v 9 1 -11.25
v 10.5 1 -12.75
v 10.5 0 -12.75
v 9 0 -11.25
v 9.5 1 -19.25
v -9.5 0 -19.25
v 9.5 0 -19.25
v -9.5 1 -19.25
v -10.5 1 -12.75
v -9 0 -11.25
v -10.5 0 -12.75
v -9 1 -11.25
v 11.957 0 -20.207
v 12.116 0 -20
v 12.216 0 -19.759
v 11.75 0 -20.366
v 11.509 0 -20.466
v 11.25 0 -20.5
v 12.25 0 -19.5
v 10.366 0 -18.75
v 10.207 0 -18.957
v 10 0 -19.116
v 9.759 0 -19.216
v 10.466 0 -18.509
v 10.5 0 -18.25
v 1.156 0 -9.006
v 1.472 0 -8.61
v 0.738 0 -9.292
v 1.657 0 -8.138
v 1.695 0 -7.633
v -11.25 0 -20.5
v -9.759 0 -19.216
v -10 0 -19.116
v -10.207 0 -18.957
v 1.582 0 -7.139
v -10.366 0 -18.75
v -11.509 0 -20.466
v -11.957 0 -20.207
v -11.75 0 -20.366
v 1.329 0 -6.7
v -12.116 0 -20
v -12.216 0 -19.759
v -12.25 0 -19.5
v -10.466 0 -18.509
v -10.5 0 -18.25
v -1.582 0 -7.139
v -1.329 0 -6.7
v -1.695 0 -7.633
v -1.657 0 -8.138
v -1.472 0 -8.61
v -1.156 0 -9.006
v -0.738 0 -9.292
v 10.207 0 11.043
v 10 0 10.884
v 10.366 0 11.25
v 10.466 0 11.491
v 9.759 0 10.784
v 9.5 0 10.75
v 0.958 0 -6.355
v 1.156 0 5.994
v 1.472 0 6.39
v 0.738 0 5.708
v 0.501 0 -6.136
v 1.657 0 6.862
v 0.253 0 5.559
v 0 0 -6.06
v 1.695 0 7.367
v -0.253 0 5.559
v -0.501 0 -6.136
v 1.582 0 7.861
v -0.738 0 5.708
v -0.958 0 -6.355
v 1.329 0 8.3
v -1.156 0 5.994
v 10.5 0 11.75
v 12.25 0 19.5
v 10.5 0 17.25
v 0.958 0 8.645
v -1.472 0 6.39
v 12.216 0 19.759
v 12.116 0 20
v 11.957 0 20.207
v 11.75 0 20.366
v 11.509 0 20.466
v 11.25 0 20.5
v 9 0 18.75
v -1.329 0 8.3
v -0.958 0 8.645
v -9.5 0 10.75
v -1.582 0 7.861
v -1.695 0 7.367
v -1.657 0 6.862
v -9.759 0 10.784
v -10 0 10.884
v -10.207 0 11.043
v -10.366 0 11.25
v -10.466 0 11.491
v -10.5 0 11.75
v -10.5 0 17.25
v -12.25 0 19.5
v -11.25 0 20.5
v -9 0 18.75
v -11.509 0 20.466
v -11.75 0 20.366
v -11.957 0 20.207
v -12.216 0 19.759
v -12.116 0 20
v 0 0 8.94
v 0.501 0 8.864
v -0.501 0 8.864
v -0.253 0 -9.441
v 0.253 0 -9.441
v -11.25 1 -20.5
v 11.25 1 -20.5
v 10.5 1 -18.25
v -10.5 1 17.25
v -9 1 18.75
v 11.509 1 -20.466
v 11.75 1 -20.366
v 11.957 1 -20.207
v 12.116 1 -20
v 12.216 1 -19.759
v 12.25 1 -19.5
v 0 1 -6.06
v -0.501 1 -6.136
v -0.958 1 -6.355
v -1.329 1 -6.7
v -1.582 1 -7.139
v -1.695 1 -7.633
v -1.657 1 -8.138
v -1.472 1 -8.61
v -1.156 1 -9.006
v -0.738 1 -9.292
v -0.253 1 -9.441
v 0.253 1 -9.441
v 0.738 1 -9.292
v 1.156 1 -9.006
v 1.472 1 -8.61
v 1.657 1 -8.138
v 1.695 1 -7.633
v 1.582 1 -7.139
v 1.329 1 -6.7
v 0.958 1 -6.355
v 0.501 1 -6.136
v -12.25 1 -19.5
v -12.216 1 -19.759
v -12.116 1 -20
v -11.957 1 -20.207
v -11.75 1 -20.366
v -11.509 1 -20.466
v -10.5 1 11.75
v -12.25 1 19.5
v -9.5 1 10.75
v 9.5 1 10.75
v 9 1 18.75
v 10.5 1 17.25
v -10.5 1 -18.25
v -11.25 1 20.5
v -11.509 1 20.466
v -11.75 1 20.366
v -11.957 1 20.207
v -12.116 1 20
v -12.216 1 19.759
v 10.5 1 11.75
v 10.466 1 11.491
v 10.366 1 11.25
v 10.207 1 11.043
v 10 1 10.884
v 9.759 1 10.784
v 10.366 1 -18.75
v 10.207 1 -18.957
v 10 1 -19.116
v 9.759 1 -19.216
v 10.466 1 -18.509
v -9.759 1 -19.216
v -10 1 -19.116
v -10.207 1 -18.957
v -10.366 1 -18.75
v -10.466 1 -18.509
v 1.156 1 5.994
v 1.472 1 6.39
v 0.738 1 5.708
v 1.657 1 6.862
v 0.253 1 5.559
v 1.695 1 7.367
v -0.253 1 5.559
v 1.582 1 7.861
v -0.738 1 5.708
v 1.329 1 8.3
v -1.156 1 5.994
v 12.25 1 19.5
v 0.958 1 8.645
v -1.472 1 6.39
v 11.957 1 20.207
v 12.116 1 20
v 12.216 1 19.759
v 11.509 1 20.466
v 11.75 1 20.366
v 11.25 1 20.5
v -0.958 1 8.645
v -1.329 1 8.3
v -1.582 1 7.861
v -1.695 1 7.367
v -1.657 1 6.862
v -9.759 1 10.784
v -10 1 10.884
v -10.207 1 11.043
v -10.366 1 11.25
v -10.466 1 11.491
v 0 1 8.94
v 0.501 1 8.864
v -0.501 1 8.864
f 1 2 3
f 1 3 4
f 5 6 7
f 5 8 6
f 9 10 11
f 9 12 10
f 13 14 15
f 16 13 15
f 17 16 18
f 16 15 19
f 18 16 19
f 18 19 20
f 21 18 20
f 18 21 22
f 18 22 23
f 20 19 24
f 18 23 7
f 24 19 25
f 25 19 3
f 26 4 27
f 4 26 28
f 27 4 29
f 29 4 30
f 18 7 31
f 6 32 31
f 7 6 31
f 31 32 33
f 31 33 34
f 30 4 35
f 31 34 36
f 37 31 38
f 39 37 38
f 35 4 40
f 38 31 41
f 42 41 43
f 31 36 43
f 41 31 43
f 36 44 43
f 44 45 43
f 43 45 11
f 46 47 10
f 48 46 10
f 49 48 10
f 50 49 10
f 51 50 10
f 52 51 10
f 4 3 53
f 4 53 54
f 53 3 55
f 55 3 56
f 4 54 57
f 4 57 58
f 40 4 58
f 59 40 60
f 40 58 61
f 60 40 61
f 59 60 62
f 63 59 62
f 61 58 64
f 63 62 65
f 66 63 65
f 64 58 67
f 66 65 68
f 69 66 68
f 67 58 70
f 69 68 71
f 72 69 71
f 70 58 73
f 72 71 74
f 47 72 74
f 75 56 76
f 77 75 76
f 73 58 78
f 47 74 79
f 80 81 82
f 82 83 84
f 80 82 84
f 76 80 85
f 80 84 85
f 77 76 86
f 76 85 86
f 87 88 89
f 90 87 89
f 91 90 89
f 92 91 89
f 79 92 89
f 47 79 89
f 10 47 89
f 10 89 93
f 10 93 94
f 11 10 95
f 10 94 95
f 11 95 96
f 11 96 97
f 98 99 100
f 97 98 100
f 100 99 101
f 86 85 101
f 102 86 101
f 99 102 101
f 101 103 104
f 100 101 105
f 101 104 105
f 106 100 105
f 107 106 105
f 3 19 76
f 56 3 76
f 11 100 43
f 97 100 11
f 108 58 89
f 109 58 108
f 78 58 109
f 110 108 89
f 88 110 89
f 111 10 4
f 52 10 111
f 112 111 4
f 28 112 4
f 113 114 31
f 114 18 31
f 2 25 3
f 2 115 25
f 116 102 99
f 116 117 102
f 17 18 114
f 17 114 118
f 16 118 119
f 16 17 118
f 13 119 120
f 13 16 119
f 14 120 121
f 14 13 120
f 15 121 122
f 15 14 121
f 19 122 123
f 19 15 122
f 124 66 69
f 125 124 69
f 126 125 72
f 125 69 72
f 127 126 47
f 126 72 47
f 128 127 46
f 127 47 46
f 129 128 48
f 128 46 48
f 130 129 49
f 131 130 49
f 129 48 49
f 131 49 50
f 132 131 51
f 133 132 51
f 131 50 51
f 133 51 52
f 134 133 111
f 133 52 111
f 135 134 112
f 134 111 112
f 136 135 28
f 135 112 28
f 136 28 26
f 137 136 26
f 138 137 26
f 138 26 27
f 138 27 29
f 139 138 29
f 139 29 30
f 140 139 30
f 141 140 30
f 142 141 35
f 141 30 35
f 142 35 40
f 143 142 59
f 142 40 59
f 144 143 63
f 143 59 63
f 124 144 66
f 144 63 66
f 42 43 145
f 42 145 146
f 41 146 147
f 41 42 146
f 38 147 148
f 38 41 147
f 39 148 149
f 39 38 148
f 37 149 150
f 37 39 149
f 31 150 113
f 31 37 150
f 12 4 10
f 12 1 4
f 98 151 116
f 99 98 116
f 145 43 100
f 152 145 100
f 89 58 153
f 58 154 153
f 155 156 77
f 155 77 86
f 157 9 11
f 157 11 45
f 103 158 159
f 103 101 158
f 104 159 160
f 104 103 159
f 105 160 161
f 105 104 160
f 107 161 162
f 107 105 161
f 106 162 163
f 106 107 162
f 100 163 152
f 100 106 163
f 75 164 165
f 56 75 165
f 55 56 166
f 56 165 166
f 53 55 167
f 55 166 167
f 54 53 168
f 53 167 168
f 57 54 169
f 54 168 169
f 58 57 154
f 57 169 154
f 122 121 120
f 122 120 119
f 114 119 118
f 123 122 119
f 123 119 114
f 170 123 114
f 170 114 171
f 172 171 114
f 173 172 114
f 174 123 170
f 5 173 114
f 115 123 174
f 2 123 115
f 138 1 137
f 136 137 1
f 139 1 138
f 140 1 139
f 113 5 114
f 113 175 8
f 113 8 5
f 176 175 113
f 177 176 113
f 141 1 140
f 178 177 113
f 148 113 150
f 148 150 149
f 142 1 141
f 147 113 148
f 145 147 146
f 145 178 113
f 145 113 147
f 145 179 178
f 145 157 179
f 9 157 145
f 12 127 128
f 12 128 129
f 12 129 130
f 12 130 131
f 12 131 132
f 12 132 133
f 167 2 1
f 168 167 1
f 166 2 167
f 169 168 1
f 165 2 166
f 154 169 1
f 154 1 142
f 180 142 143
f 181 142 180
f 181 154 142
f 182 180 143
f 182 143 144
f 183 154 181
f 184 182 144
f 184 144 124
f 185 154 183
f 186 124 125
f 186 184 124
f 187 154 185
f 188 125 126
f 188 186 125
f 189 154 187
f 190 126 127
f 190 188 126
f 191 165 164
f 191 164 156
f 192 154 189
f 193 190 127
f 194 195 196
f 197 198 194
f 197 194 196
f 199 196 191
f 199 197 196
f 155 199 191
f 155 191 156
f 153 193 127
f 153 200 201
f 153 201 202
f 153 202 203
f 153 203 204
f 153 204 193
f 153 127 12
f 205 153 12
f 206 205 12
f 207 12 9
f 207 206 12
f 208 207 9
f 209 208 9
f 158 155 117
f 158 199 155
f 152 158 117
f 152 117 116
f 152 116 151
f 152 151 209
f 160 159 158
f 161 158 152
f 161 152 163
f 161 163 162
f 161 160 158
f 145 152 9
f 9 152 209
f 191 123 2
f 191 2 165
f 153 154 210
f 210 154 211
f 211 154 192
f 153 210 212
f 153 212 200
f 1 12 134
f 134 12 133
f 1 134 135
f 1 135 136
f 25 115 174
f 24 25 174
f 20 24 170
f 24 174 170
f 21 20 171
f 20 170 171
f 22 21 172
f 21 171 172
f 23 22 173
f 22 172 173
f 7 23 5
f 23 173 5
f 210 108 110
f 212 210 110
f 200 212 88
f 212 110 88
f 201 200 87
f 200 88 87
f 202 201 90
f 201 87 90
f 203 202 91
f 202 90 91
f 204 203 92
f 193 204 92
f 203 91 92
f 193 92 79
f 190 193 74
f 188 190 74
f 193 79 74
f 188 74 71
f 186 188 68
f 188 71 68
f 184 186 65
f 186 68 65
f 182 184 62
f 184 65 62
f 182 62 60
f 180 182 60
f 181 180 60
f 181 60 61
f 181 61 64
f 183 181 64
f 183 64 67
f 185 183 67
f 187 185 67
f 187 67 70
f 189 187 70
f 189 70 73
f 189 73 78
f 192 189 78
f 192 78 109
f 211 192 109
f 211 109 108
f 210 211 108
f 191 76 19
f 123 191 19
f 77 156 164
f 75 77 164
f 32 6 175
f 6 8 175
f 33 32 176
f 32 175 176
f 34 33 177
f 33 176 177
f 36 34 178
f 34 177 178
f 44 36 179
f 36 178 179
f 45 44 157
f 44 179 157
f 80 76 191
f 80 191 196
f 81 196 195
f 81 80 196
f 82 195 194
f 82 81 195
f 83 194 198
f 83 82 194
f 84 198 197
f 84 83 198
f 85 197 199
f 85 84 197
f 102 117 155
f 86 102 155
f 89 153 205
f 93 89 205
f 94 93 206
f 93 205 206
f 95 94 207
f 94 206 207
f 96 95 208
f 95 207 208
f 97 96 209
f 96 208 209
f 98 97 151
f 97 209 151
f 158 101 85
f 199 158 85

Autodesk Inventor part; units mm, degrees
ref_plane "YZ Plane" through (0, 0, 0) normal (1, 0, 0) x (0, 1, 0)
ref_plane "XZ Plane" through (0, 0, 0) normal (0, 1, 0) x (-1, 0, 0)
ref_plane "XY Plane" through (0, 0, 0) normal (0, 0, 1) x (1, 0, 0)
sketch "Sketch1" plane through (0, 0, 0) normal (0, 1, 0) x (-1, 0, 0)
  line L0 (-11.25, -20.5) -> (11.25, -20.5)
  line L1 (12.25, -19.5) -> (12.25, 19.5)
  line L2 (11.25, 20.5) -> (-11.25, 20.5)
  line L3 (-12.25, 19.5) -> (-12.25, -19.5)
  line L4 (-12.25, -20.5) -> (12.25, 20.5) construction
  line L5 (12.25, -20.5) -> (-12.25, 20.5) construction
  arc A0 (12.25, 19.5) -> (11.25, 20.5) centre (11.25, 19.5) ccw
  arc A1 (-11.25, 20.5) -> (-12.25, 19.5) centre (-11.25, 19.5) ccw
  arc A2 (-12.25, -19.5) -> (-11.25, -20.5) centre (-11.25, -19.5) ccw
  arc A3 (11.25, -20.5) -> (12.25, -19.5) centre (11.25, -19.5) ccw
  point P0 (0, 0)
  dimension "d0" = 24.5
  dimension "d1" = 41
  dimension "d2" = 1
extrude "Extrusion1" add sketch "Sketch1" along normal blind 1
sketch "Sketch2" plane through (0, 1, 0) normal (0, 1, 0) x (1, 0, 0)
  line L0 (9.5, -10.75) -> (-9.5, -10.75)
  line L1 (-10.5, -11.75) -> (-10.5, -17.25)
  line L2 (-9, -18.75) -> (9, -18.75)
  line L3 (10.5, -17.25) -> (10.5, -11.75)
  line L4 (10.5, -10.75) -> (-10.5, -18.75) construction
  line L5 (-10.5, -10.75) -> (10.5, -18.75) construction
  line L6 (-9.5, 19.25) -> (9.5, 19.25)
  line L7 (10.5, 18.25) -> (10.5, 12.75)
  line L8 (9, 11.25) -> (-9, 11.25)
  line L9 (-10.5, 12.75) -> (-10.5, 18.25)
  line L10 (-10.5, 19.25) -> (10.5, 11.25) construction
  line L11 (10.5, 19.25) -> (-10.5, 11.25) construction
  line L12 (11.25, 20.5) -> (-11.25, 20.5) projected
  arc A0 (-9.5, -10.75) -> (-10.5, -11.75) centre (-9.5, -11.75) ccw
  arc A1 (10.5, -11.75) -> (9.5, -10.75) centre (9.5, -11.75) ccw
  arc A2 (-9.5, 19.25) -> (-10.5, 18.25) centre (-9.5, 18.25) ccw
  arc A3 (10.5, 18.25) -> (9.5, 19.25) centre (9.5, 18.25) ccw
  line L13 (10.5, -17.25) -> (9, -18.75)
  line L14 (10.5, 12.75) -> (9, 11.25)
  line L15 (-9, -18.75) -> (-10.5, -17.25)
  line L16 (-9, 11.25) -> (-10.5, 12.75)
  point P0 (0, 0)
  point P1 (0, -14.75)
  point P2 (0, 15.25)
  dimension "d5" = 30
  dimension "d8" = 1.25
  dimension "d9" = 8
  dimension "d10" = 8
  dimension "d11" = 21
  dimension "d12" = 21
  dimension "d14" = 1.5
  dimension "d15" = 1.5
  dimension "d16" = 1.5
  dimension "d17" = 1.5
  dimension "d18" = 1.5
  dimension "d19" = 1.5
  dimension "d20" = 1.5
  dimension "d21" = 1
  dimension "d22" = 1
extrude "Extrusion2" cut sketch "Sketch2" against normal through all
sketch "Sketch3" plane through (0, 1, 0) normal (0, 1, 0) x (1, 0, 0)
  line L0 (11.25, 20.5) -> (-11.25, 20.5) projected
  point P0 (0, 0)
  point P1 (0, -7.24)
  point P2 (0, 7.76)
  dimension "d23" = 15
  dimension "d24" = 12.74
hole "Hole1" at (0, 1, 7.24) at (0, 1, -7.76) direction (0, -1, 0) diameter 3.4 depth 7.9 tip angle 118 clearance for "Flat Head Machine Screw" size "M3" standard "Ansi Metric M Profile"
equation "\"d10\" = d9"
equation "\"d12\" = d11"
equation "\"d15\" = d14"
equation "\"d16\" = d14"
equation "\"d17\" = d15"
equation "\"d18\" = d15"
equation "\"d19\" = d14"
equation "\"d20\" = d15"
properties part number "flex clamp V1" material "Stainless Steel"
